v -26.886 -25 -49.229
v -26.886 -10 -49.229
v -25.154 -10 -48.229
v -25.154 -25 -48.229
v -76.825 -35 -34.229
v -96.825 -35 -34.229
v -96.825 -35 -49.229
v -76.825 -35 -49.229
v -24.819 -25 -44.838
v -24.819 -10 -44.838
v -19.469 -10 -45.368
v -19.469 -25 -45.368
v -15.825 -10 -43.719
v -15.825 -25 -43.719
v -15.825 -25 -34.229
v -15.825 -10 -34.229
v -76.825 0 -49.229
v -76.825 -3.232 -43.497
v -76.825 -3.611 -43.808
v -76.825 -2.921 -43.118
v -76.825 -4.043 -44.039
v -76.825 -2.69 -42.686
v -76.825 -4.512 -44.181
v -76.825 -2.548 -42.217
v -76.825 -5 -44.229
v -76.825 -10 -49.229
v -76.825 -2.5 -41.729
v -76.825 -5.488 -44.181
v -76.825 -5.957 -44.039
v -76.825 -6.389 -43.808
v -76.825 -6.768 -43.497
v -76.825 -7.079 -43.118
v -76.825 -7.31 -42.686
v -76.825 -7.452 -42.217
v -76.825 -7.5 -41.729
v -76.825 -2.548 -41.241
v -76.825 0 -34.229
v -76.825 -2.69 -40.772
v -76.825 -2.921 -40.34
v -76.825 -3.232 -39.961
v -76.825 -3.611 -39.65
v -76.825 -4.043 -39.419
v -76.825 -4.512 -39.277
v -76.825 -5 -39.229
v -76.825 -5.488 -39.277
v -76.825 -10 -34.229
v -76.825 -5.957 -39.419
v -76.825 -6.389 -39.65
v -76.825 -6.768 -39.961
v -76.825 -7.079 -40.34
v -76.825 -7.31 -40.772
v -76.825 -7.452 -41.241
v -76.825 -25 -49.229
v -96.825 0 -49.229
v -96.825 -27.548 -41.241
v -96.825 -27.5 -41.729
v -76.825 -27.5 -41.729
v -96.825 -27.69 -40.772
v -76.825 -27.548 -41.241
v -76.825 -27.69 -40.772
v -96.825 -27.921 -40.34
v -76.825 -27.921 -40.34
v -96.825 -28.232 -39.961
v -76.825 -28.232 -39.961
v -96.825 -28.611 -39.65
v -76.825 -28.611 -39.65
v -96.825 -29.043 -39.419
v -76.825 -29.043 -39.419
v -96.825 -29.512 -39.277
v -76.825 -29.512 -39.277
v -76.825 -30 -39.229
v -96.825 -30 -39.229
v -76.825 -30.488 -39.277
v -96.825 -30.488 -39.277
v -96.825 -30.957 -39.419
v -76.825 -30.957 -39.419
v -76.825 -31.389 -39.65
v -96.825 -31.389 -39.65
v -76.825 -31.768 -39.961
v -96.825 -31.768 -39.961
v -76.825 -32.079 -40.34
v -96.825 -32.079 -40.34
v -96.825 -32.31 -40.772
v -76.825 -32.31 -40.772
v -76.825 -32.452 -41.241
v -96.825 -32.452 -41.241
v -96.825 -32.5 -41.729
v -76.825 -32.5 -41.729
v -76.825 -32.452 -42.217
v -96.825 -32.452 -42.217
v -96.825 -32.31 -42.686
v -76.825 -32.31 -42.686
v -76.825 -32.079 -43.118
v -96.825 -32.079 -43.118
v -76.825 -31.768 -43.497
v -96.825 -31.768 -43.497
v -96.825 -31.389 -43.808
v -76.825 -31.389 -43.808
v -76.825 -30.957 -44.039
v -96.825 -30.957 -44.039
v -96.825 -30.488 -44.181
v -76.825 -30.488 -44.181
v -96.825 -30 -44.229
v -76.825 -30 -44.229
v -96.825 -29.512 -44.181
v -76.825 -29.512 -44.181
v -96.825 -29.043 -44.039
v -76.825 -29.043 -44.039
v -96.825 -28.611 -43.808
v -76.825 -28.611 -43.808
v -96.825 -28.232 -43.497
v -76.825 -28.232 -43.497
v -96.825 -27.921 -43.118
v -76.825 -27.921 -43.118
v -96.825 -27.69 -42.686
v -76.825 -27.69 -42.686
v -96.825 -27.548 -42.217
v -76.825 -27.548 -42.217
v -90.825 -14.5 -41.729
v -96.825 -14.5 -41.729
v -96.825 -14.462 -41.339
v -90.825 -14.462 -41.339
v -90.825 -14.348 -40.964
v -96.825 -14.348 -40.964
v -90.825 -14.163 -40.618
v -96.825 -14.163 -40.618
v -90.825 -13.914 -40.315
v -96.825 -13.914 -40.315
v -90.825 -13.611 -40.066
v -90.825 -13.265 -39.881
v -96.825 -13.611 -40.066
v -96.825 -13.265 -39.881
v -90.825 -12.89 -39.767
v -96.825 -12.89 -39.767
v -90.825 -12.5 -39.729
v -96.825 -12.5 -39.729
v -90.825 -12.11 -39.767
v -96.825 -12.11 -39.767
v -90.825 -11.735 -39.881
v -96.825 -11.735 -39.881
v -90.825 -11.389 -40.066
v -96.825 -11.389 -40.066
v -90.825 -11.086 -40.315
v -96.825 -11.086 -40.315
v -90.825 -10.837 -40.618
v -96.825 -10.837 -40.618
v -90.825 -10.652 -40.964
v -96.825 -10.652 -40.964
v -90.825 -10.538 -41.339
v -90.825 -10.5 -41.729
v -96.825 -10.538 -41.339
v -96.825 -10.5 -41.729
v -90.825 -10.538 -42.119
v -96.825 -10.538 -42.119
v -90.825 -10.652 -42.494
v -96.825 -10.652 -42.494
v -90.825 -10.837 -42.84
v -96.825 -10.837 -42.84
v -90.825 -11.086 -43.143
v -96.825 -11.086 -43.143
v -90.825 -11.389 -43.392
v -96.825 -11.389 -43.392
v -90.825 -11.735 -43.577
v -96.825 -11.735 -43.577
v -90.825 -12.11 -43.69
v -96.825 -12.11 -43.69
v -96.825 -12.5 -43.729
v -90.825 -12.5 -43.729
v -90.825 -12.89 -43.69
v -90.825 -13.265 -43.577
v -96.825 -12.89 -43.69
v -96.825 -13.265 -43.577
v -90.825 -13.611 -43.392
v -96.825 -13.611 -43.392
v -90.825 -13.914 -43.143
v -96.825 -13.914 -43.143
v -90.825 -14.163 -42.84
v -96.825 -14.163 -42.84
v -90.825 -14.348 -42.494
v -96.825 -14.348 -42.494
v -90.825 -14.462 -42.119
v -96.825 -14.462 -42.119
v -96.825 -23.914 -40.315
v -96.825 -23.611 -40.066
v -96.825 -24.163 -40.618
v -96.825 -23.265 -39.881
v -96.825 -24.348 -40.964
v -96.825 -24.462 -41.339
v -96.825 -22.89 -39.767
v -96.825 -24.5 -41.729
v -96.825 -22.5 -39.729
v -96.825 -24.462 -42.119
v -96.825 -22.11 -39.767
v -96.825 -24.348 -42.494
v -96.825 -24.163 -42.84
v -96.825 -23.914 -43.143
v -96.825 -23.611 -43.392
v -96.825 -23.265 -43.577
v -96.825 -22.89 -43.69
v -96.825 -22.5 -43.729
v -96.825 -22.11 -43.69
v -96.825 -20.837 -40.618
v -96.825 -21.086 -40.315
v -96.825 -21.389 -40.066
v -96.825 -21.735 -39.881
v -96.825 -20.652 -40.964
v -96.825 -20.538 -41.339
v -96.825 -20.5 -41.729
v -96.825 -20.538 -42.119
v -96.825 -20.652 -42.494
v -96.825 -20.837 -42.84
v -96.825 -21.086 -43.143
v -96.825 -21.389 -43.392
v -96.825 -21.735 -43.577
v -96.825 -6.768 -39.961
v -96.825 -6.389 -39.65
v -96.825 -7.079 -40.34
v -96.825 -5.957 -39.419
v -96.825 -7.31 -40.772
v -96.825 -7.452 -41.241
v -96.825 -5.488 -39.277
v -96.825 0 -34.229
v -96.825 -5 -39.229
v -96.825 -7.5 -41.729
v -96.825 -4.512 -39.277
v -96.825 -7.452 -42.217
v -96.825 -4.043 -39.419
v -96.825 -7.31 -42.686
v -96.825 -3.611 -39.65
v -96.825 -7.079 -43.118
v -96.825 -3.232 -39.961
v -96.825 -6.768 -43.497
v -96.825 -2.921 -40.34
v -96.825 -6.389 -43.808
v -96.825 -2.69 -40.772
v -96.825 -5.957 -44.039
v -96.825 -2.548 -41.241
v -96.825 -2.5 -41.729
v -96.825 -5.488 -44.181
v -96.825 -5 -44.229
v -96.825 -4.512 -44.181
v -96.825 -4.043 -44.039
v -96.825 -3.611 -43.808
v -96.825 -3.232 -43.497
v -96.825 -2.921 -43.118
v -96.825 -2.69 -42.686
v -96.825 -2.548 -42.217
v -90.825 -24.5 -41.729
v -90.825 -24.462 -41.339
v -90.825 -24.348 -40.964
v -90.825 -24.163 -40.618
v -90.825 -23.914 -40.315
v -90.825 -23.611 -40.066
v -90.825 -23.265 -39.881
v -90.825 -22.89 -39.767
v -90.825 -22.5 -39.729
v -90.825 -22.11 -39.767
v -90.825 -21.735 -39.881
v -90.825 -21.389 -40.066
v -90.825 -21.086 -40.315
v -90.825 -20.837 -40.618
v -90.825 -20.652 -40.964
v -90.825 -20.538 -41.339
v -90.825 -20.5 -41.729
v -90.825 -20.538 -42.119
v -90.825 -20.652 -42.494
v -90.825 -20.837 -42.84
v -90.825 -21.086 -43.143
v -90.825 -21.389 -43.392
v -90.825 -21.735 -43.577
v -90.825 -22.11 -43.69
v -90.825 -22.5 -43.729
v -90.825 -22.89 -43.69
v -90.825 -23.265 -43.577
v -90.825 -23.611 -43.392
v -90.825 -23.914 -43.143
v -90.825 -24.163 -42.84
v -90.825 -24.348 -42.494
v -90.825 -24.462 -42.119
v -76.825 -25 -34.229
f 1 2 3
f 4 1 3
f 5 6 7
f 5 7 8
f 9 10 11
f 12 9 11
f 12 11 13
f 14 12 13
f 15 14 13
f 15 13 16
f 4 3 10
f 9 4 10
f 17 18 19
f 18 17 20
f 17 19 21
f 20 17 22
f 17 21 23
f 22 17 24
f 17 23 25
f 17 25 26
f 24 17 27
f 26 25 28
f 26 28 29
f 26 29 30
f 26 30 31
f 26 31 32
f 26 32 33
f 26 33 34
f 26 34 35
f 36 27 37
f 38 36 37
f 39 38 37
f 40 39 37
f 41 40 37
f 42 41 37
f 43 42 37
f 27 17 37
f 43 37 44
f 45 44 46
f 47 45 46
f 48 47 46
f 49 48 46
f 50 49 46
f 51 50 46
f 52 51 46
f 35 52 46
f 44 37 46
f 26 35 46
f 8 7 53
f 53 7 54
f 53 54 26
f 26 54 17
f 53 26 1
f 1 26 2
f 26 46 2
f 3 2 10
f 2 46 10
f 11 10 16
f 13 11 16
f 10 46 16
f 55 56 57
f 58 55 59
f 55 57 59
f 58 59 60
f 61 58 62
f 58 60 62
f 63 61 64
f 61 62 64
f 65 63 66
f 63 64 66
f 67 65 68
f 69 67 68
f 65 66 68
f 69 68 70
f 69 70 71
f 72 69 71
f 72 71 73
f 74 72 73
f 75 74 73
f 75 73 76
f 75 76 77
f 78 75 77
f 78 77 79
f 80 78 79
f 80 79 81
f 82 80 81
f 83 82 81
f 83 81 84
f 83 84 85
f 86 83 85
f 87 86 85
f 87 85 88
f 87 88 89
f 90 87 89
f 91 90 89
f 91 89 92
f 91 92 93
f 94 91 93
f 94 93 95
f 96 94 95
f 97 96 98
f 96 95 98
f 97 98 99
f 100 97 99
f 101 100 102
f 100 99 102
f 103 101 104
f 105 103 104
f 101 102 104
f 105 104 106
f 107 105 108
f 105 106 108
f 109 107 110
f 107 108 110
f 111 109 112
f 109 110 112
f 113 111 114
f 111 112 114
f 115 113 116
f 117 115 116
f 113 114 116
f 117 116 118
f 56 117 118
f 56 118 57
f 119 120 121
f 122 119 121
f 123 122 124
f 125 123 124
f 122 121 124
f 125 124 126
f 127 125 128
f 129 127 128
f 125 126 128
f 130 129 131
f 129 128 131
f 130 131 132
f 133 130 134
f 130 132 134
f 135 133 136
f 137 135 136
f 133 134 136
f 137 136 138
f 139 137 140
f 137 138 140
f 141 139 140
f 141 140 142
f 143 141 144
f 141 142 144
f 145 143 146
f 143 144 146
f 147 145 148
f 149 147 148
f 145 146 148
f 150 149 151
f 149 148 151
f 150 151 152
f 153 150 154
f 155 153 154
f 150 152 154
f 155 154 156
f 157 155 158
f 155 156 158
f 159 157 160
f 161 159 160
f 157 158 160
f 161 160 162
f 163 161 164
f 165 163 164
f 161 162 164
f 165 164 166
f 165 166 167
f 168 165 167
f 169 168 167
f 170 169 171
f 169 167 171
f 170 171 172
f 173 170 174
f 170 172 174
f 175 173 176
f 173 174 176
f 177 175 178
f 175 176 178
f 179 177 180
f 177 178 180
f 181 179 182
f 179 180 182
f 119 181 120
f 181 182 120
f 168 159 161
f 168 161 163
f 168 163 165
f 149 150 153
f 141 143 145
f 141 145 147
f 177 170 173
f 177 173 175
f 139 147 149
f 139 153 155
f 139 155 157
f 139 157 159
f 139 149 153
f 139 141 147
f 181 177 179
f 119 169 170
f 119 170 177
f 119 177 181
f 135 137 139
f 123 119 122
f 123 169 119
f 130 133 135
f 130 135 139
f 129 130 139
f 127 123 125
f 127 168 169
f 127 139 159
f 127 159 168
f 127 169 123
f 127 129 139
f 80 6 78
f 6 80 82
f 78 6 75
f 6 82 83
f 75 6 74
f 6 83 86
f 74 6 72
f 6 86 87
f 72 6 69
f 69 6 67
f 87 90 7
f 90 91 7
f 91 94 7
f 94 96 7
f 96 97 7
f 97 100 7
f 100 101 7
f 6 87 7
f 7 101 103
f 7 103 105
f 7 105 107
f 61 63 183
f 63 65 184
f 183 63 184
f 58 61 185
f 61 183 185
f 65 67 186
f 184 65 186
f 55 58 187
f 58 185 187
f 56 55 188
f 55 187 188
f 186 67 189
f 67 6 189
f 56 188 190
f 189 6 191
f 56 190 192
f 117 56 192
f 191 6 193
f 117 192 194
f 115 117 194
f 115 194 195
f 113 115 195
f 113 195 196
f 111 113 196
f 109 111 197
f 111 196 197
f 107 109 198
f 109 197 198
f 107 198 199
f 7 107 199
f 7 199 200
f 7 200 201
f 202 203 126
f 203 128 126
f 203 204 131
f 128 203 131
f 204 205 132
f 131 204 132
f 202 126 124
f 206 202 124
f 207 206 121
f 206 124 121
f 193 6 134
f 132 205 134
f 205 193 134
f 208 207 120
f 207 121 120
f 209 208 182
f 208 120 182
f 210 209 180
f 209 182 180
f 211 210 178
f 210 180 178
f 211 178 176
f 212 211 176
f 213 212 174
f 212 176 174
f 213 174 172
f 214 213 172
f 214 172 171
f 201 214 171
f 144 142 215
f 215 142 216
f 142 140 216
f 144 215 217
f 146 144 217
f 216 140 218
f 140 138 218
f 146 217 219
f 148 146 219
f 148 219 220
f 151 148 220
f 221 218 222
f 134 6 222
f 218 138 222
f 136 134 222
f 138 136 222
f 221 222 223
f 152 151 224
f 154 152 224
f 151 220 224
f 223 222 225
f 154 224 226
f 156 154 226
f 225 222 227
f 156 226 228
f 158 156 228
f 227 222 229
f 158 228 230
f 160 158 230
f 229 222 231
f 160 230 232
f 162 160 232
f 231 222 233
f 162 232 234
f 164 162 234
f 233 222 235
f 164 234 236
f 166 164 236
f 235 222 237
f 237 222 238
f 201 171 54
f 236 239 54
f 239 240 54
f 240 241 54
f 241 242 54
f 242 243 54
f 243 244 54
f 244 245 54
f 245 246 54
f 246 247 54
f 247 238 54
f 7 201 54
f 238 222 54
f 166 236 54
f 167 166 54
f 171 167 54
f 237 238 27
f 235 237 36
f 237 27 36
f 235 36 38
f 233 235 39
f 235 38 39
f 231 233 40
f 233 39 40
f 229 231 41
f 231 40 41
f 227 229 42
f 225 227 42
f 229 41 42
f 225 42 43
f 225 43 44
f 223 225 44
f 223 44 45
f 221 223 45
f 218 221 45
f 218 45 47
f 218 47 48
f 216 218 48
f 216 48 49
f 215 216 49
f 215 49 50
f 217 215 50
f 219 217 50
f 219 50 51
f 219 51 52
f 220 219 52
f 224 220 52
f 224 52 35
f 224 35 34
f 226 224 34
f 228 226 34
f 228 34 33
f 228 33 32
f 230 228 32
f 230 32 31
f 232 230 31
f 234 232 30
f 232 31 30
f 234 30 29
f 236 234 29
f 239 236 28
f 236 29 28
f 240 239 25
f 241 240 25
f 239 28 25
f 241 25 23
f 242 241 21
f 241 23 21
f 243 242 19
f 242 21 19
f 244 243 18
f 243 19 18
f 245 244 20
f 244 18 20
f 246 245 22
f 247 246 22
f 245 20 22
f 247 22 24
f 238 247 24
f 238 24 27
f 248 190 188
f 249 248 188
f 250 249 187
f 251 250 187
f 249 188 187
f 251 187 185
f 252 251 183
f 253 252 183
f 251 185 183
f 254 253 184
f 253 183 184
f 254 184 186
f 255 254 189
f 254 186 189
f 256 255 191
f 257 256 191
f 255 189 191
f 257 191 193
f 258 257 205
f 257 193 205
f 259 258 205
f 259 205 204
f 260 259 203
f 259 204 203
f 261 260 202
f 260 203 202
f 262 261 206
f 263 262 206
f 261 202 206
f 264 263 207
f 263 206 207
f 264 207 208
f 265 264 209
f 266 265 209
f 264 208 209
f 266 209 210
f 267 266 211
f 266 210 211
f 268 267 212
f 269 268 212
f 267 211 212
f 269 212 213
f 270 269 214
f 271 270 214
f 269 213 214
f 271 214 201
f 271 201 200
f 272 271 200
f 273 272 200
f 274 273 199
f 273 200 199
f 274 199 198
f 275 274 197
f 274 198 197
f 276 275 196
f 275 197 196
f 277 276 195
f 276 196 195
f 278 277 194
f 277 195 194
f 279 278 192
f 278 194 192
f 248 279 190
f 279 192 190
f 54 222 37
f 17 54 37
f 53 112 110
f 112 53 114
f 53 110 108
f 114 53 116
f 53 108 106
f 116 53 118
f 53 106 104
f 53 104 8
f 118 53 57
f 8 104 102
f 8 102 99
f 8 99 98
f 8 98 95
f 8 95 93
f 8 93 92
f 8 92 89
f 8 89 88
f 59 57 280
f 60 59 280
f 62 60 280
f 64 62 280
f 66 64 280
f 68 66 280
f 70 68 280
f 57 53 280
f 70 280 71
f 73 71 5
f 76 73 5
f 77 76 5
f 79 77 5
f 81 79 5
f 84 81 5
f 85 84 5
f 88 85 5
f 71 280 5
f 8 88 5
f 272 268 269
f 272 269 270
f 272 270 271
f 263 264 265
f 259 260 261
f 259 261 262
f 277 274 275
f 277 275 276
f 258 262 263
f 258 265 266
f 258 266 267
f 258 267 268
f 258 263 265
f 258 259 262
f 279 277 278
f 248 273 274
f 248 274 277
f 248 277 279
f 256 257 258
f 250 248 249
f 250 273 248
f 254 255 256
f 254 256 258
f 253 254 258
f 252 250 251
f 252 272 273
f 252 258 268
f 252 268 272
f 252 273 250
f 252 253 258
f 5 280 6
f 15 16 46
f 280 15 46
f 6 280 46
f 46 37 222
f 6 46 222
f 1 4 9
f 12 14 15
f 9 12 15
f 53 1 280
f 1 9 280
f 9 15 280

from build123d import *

# Parameters (mm, degrees)
F0_W     = 20
F0_H     = 7.5
F1_DEPTH = 35
F3_DEPTH = 15.001
F4_R     = 2.5
F6_DEPTH = 20.001
F5_R     = 2
F7_DEPTH = 6


with BuildPart() as f1:
    # F0 (on Front) → F1 (new body)
    with BuildSketch(Plane.XZ):
        with Locations((-86.824563, -45.478924)):
            Rectangle(F0_W, F0_H)
        Polygon((-76.824563, -41.728924), (-76.824563, -49.228924), (-26.88636, -49.228924), (-25.15431, -48.228924), (-24.818535, -44.838258), (-19.468897, -45.368028), (-15.824563, -43.719141), (-15.824563, -34.228924), (-76.824563, -34.228924), (-76.824563, -39.228924), align=None)
        Polygon((-96.824563, -39.228924), (-96.824563, -41.728924), (-76.824563, -41.728924), (-76.824563, -39.228924), (-76.824563, -34.228924), (-96.824563, -34.228924), align=None)
    extrude(amount=F1_DEPTH)

    # F2 (on face) → F3 (cut, through all)
    with BuildSketch(Plane.XY.offset(-34.228924)):
        Polygon((-76.824563, -30), (-76.824563, -35), (-15.824563, -35), (-15.824563, -25), (-24.818535, -25), (-76.824563, -25), align=None)
        Polygon((-76.824563, 0), (-76.824563, -5), (-76.824563, -10), (-24.818535, -10), (-15.824563, -10), (-15.824563, 0), align=None)
    extrude(amount=-F3_DEPTH, mode=Mode.SUBTRACT)

    # F4 (on face) → F6 (cut, through all)
    with BuildSketch(Plane.YZ.offset(-76.824563)):
        with Locations((-5, -41.728924)):
            Circle(F4_R)
        with Locations((-30, -41.728924)):
            Circle(F4_R)
    extrude(amount=-F6_DEPTH, mode=Mode.SUBTRACT)

    # F5 (on face) → F7 (cut)
    with BuildSketch(Plane(origin=(-96.824563, 0, 0), x_dir=(0, -1, 0), z_dir=(-1, 0, 0))):
        with Locations((22.5, -41.728924)):
            Circle(F5_R)
        with Locations((12.5, -41.728924)):
            Circle(F5_R)
    extrude(amount=-F7_DEPTH, mode=Mode.SUBTRACT)


solid = f1.part
